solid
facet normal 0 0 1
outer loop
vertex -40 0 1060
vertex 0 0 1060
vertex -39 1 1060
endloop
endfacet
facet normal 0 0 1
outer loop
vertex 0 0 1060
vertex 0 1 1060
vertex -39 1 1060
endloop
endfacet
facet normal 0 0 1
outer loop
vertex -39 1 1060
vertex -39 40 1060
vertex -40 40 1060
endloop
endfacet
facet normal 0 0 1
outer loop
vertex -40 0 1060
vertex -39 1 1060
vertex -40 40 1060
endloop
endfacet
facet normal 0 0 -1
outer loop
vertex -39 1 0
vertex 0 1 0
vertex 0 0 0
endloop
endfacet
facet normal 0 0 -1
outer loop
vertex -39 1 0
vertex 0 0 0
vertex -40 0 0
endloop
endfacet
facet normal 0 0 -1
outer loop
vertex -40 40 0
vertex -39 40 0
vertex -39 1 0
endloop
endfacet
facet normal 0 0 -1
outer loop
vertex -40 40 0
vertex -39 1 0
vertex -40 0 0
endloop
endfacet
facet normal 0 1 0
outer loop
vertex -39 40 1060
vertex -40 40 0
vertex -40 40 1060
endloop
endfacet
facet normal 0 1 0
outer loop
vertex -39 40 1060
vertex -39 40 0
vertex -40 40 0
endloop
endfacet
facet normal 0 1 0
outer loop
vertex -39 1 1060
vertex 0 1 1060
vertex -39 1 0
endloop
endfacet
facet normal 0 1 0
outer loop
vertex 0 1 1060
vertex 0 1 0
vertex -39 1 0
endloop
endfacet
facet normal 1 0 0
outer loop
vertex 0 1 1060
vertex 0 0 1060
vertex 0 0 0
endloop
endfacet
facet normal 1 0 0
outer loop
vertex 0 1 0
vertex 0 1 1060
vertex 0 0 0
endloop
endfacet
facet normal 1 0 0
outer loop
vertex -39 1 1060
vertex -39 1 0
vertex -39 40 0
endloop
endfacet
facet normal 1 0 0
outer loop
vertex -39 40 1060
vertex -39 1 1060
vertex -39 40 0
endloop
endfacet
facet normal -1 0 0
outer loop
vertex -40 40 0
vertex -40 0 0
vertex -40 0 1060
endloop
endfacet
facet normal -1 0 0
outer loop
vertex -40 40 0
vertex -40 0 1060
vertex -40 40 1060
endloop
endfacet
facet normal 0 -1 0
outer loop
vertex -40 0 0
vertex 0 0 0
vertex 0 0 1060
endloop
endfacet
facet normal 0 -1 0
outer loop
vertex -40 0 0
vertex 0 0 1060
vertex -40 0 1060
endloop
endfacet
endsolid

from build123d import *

# Parameters (mm, degrees)
SUPERFICIE_EXTRUIR1_1_DEPTH = 1060
DAR_ESPESOR1_T2             = 1


with BuildPart() as body_1:
    # Superficie-Extruir1: a surface, the sketch's curves swept straight by 1060 mm
    with BuildLine(Plane.XY, mode=Mode.PRIVATE) as superficie_extruir1_1_path:
        Line((0, 0), (-40, 0))
        Line((-40, 0), (-40, 40))
    superficie_extruir1_1 = Shell.extrude(superficie_extruir1_1_path.wire(), (0 * SUPERFICIE_EXTRUIR1_1_DEPTH, 0 * SUPERFICIE_EXTRUIR1_1_DEPTH, 1 * SUPERFICIE_EXTRUIR1_1_DEPTH))
    add(Solid.thicken(superficie_extruir1_1, -DAR_ESPESOR1_T2))


solid = body_1.part
